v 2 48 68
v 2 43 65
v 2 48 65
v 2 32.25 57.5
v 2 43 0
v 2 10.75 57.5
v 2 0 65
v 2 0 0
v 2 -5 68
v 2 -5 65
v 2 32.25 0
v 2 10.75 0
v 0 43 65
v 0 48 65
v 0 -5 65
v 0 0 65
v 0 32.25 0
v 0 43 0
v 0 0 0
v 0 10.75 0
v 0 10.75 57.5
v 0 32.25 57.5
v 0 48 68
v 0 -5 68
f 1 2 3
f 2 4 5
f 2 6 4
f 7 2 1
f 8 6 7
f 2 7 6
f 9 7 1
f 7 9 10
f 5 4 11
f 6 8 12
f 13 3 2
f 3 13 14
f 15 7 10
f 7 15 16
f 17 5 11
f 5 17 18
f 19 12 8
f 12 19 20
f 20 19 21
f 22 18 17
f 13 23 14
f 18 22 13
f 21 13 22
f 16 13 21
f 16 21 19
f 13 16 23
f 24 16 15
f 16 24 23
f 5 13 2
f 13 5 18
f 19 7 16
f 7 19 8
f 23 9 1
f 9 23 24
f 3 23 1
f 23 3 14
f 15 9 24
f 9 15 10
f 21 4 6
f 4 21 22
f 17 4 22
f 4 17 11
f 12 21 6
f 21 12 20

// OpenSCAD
height = 43;
long = 60;
border = 5;
space = 2;
size = 2;

difference()
{
    union()
    {
        cube([size, height, long + border]);
        translate([0, -border, long + border])
        cube([size, height + border * 2, 3]);
    }
    
    translate([-2, (height - height / space) / 2, -5])
    cube([10, height / space, long + border / 2]);
}
